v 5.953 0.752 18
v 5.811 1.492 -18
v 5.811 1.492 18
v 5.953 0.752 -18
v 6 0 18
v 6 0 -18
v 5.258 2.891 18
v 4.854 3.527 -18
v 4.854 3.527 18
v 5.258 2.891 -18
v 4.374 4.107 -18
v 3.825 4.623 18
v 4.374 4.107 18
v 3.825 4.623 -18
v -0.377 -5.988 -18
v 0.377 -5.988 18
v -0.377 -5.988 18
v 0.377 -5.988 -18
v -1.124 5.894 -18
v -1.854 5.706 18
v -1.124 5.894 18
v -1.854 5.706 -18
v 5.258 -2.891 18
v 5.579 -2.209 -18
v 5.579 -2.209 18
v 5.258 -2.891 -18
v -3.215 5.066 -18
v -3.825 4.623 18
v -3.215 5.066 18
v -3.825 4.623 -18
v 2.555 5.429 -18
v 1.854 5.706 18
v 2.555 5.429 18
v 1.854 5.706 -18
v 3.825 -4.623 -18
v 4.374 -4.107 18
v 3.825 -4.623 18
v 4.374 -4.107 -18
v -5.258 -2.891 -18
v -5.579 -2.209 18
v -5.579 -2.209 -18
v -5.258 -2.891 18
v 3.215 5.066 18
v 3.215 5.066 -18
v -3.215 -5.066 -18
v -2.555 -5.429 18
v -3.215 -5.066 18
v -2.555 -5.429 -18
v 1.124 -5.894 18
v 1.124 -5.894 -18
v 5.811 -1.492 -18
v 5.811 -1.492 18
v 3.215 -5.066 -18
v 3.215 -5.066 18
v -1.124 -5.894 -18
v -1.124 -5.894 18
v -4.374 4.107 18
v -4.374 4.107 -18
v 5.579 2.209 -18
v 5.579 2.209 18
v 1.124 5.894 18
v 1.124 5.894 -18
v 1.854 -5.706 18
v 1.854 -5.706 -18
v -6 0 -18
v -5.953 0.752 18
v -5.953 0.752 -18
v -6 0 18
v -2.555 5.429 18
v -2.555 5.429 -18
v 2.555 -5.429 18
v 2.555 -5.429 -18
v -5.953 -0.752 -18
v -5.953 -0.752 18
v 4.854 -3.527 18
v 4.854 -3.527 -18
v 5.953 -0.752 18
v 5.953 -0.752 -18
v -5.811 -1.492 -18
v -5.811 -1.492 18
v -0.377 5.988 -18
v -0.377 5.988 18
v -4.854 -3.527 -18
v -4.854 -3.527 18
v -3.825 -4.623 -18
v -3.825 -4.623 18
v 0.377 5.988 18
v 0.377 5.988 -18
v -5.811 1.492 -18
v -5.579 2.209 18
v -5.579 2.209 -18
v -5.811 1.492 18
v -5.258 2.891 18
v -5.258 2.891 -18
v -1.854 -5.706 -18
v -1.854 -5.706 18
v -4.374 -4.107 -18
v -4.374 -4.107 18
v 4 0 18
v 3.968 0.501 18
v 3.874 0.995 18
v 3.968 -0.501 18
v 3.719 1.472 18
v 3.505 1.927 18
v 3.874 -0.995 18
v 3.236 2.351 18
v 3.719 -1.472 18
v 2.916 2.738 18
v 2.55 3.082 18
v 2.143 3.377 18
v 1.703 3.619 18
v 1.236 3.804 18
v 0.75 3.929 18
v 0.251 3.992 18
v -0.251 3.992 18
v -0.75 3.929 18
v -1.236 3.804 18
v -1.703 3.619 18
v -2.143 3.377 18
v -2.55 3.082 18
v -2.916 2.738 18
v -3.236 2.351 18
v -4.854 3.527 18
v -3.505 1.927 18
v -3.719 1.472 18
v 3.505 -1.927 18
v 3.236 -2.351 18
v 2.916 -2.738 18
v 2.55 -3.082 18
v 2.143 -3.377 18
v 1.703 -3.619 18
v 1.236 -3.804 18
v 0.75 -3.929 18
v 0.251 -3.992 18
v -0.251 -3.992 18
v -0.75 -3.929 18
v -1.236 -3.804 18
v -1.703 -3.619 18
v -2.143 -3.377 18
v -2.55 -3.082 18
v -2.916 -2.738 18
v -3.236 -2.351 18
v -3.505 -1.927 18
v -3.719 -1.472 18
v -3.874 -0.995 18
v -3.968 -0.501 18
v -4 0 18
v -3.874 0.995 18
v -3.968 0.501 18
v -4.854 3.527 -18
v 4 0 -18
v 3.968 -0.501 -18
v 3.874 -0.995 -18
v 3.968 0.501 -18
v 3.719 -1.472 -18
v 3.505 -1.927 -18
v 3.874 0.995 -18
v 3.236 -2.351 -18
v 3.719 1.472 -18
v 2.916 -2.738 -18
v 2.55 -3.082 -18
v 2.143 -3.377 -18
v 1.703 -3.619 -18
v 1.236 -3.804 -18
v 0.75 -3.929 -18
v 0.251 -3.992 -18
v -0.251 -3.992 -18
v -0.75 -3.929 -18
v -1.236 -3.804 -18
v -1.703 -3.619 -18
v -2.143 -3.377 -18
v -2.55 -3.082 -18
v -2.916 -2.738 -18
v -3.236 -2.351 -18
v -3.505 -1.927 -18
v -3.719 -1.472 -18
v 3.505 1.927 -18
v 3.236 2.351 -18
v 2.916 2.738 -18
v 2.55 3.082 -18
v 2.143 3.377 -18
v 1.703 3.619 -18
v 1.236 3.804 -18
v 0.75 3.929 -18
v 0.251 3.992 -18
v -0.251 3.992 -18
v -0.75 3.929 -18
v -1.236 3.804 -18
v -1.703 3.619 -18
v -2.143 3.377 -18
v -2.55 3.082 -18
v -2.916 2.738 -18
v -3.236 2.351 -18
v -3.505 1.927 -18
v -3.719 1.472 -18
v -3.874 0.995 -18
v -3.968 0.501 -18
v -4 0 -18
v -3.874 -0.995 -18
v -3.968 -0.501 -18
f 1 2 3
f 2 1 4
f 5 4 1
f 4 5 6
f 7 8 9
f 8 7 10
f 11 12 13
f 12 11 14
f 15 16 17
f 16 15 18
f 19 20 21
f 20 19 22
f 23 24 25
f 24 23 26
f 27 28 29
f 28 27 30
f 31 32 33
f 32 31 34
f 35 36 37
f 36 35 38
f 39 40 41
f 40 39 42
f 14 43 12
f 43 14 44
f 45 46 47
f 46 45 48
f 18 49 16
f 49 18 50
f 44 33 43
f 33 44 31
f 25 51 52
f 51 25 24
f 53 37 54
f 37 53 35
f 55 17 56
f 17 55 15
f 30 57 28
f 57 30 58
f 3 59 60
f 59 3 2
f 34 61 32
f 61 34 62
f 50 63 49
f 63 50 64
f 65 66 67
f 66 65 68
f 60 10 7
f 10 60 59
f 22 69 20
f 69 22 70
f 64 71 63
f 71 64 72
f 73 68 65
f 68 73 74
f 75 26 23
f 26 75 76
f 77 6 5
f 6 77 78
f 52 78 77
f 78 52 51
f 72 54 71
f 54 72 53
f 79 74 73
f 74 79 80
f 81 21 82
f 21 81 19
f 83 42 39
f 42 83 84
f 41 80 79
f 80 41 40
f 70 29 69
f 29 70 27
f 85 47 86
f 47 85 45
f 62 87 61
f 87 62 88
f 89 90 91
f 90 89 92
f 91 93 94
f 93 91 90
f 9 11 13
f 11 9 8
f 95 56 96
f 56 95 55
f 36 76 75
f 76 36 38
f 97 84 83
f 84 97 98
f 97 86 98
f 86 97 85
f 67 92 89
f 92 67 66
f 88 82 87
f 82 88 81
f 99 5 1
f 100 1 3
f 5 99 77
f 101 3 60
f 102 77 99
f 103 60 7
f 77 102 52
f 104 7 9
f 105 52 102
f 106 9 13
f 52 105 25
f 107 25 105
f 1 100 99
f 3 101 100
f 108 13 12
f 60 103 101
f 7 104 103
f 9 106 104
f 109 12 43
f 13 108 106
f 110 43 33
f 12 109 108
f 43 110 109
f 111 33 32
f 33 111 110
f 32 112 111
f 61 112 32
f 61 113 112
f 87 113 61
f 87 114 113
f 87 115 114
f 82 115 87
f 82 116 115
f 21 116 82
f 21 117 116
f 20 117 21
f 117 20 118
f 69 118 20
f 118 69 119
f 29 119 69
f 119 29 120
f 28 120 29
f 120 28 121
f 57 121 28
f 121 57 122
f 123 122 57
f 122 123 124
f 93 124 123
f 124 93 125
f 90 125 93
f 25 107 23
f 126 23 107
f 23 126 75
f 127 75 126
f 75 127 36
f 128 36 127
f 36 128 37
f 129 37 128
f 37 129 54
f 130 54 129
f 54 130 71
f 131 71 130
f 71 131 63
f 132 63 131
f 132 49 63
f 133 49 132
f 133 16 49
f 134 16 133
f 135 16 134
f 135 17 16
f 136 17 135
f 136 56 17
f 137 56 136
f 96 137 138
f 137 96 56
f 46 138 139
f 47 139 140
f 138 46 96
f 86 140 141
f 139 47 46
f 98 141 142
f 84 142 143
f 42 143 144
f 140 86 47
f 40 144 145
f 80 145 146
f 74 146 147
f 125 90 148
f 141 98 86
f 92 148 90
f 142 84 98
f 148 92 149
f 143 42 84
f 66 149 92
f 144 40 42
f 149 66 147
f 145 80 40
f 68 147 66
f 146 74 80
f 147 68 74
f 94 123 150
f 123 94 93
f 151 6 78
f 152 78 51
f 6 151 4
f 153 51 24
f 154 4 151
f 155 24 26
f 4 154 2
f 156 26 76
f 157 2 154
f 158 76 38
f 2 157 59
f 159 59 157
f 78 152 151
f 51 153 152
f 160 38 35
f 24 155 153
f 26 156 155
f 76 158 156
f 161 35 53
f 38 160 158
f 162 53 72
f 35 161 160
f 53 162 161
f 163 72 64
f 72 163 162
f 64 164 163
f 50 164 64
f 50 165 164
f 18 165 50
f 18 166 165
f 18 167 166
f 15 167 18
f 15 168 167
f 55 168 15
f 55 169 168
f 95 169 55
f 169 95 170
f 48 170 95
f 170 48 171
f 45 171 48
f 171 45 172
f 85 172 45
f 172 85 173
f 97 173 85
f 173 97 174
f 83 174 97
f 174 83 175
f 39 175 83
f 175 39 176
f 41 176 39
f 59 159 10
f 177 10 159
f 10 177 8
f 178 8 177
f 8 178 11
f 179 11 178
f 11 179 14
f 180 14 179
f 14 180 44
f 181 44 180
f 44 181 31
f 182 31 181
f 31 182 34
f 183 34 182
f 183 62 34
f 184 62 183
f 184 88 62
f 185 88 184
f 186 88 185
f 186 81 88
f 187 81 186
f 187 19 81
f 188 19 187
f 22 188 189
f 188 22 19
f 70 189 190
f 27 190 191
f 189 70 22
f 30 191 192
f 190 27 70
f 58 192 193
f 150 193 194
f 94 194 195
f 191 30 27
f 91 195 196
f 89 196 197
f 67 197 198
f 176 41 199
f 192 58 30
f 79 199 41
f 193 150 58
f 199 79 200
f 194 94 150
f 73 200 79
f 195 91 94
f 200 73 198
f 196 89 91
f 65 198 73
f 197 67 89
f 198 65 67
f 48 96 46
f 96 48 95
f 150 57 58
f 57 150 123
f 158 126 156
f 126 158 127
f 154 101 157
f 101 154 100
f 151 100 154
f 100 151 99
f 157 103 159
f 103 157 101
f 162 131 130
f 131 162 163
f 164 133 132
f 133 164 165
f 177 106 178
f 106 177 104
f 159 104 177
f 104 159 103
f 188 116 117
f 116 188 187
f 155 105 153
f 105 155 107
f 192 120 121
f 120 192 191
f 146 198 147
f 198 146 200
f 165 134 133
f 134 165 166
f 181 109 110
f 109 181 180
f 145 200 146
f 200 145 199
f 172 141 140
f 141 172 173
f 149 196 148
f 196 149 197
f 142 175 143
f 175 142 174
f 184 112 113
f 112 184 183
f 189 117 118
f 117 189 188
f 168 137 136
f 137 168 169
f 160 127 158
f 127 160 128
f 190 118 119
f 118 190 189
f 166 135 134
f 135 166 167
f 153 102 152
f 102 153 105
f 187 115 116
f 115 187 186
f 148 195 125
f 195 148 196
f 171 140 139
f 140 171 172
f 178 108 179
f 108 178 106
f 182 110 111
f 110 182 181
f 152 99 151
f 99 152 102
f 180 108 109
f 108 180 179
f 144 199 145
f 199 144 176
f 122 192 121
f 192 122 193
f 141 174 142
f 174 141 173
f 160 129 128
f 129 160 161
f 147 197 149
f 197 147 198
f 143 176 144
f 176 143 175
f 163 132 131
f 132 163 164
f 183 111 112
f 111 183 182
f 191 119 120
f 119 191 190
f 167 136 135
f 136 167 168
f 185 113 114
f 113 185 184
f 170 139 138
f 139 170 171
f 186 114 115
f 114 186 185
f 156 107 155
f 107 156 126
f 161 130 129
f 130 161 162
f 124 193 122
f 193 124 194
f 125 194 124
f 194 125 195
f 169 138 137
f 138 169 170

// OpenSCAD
$fn = 50;


difference() {
	union() {
		translate(v = [0, 0, -18.0000000000]) {
			cylinder(h = 36, r = 6.0000000000);
		}
	}
	union() {
		translate(v = [0, 0, -100.0000000000]) {
			cylinder(h = 200, r = 4.0000000000);
		}
	}
}
